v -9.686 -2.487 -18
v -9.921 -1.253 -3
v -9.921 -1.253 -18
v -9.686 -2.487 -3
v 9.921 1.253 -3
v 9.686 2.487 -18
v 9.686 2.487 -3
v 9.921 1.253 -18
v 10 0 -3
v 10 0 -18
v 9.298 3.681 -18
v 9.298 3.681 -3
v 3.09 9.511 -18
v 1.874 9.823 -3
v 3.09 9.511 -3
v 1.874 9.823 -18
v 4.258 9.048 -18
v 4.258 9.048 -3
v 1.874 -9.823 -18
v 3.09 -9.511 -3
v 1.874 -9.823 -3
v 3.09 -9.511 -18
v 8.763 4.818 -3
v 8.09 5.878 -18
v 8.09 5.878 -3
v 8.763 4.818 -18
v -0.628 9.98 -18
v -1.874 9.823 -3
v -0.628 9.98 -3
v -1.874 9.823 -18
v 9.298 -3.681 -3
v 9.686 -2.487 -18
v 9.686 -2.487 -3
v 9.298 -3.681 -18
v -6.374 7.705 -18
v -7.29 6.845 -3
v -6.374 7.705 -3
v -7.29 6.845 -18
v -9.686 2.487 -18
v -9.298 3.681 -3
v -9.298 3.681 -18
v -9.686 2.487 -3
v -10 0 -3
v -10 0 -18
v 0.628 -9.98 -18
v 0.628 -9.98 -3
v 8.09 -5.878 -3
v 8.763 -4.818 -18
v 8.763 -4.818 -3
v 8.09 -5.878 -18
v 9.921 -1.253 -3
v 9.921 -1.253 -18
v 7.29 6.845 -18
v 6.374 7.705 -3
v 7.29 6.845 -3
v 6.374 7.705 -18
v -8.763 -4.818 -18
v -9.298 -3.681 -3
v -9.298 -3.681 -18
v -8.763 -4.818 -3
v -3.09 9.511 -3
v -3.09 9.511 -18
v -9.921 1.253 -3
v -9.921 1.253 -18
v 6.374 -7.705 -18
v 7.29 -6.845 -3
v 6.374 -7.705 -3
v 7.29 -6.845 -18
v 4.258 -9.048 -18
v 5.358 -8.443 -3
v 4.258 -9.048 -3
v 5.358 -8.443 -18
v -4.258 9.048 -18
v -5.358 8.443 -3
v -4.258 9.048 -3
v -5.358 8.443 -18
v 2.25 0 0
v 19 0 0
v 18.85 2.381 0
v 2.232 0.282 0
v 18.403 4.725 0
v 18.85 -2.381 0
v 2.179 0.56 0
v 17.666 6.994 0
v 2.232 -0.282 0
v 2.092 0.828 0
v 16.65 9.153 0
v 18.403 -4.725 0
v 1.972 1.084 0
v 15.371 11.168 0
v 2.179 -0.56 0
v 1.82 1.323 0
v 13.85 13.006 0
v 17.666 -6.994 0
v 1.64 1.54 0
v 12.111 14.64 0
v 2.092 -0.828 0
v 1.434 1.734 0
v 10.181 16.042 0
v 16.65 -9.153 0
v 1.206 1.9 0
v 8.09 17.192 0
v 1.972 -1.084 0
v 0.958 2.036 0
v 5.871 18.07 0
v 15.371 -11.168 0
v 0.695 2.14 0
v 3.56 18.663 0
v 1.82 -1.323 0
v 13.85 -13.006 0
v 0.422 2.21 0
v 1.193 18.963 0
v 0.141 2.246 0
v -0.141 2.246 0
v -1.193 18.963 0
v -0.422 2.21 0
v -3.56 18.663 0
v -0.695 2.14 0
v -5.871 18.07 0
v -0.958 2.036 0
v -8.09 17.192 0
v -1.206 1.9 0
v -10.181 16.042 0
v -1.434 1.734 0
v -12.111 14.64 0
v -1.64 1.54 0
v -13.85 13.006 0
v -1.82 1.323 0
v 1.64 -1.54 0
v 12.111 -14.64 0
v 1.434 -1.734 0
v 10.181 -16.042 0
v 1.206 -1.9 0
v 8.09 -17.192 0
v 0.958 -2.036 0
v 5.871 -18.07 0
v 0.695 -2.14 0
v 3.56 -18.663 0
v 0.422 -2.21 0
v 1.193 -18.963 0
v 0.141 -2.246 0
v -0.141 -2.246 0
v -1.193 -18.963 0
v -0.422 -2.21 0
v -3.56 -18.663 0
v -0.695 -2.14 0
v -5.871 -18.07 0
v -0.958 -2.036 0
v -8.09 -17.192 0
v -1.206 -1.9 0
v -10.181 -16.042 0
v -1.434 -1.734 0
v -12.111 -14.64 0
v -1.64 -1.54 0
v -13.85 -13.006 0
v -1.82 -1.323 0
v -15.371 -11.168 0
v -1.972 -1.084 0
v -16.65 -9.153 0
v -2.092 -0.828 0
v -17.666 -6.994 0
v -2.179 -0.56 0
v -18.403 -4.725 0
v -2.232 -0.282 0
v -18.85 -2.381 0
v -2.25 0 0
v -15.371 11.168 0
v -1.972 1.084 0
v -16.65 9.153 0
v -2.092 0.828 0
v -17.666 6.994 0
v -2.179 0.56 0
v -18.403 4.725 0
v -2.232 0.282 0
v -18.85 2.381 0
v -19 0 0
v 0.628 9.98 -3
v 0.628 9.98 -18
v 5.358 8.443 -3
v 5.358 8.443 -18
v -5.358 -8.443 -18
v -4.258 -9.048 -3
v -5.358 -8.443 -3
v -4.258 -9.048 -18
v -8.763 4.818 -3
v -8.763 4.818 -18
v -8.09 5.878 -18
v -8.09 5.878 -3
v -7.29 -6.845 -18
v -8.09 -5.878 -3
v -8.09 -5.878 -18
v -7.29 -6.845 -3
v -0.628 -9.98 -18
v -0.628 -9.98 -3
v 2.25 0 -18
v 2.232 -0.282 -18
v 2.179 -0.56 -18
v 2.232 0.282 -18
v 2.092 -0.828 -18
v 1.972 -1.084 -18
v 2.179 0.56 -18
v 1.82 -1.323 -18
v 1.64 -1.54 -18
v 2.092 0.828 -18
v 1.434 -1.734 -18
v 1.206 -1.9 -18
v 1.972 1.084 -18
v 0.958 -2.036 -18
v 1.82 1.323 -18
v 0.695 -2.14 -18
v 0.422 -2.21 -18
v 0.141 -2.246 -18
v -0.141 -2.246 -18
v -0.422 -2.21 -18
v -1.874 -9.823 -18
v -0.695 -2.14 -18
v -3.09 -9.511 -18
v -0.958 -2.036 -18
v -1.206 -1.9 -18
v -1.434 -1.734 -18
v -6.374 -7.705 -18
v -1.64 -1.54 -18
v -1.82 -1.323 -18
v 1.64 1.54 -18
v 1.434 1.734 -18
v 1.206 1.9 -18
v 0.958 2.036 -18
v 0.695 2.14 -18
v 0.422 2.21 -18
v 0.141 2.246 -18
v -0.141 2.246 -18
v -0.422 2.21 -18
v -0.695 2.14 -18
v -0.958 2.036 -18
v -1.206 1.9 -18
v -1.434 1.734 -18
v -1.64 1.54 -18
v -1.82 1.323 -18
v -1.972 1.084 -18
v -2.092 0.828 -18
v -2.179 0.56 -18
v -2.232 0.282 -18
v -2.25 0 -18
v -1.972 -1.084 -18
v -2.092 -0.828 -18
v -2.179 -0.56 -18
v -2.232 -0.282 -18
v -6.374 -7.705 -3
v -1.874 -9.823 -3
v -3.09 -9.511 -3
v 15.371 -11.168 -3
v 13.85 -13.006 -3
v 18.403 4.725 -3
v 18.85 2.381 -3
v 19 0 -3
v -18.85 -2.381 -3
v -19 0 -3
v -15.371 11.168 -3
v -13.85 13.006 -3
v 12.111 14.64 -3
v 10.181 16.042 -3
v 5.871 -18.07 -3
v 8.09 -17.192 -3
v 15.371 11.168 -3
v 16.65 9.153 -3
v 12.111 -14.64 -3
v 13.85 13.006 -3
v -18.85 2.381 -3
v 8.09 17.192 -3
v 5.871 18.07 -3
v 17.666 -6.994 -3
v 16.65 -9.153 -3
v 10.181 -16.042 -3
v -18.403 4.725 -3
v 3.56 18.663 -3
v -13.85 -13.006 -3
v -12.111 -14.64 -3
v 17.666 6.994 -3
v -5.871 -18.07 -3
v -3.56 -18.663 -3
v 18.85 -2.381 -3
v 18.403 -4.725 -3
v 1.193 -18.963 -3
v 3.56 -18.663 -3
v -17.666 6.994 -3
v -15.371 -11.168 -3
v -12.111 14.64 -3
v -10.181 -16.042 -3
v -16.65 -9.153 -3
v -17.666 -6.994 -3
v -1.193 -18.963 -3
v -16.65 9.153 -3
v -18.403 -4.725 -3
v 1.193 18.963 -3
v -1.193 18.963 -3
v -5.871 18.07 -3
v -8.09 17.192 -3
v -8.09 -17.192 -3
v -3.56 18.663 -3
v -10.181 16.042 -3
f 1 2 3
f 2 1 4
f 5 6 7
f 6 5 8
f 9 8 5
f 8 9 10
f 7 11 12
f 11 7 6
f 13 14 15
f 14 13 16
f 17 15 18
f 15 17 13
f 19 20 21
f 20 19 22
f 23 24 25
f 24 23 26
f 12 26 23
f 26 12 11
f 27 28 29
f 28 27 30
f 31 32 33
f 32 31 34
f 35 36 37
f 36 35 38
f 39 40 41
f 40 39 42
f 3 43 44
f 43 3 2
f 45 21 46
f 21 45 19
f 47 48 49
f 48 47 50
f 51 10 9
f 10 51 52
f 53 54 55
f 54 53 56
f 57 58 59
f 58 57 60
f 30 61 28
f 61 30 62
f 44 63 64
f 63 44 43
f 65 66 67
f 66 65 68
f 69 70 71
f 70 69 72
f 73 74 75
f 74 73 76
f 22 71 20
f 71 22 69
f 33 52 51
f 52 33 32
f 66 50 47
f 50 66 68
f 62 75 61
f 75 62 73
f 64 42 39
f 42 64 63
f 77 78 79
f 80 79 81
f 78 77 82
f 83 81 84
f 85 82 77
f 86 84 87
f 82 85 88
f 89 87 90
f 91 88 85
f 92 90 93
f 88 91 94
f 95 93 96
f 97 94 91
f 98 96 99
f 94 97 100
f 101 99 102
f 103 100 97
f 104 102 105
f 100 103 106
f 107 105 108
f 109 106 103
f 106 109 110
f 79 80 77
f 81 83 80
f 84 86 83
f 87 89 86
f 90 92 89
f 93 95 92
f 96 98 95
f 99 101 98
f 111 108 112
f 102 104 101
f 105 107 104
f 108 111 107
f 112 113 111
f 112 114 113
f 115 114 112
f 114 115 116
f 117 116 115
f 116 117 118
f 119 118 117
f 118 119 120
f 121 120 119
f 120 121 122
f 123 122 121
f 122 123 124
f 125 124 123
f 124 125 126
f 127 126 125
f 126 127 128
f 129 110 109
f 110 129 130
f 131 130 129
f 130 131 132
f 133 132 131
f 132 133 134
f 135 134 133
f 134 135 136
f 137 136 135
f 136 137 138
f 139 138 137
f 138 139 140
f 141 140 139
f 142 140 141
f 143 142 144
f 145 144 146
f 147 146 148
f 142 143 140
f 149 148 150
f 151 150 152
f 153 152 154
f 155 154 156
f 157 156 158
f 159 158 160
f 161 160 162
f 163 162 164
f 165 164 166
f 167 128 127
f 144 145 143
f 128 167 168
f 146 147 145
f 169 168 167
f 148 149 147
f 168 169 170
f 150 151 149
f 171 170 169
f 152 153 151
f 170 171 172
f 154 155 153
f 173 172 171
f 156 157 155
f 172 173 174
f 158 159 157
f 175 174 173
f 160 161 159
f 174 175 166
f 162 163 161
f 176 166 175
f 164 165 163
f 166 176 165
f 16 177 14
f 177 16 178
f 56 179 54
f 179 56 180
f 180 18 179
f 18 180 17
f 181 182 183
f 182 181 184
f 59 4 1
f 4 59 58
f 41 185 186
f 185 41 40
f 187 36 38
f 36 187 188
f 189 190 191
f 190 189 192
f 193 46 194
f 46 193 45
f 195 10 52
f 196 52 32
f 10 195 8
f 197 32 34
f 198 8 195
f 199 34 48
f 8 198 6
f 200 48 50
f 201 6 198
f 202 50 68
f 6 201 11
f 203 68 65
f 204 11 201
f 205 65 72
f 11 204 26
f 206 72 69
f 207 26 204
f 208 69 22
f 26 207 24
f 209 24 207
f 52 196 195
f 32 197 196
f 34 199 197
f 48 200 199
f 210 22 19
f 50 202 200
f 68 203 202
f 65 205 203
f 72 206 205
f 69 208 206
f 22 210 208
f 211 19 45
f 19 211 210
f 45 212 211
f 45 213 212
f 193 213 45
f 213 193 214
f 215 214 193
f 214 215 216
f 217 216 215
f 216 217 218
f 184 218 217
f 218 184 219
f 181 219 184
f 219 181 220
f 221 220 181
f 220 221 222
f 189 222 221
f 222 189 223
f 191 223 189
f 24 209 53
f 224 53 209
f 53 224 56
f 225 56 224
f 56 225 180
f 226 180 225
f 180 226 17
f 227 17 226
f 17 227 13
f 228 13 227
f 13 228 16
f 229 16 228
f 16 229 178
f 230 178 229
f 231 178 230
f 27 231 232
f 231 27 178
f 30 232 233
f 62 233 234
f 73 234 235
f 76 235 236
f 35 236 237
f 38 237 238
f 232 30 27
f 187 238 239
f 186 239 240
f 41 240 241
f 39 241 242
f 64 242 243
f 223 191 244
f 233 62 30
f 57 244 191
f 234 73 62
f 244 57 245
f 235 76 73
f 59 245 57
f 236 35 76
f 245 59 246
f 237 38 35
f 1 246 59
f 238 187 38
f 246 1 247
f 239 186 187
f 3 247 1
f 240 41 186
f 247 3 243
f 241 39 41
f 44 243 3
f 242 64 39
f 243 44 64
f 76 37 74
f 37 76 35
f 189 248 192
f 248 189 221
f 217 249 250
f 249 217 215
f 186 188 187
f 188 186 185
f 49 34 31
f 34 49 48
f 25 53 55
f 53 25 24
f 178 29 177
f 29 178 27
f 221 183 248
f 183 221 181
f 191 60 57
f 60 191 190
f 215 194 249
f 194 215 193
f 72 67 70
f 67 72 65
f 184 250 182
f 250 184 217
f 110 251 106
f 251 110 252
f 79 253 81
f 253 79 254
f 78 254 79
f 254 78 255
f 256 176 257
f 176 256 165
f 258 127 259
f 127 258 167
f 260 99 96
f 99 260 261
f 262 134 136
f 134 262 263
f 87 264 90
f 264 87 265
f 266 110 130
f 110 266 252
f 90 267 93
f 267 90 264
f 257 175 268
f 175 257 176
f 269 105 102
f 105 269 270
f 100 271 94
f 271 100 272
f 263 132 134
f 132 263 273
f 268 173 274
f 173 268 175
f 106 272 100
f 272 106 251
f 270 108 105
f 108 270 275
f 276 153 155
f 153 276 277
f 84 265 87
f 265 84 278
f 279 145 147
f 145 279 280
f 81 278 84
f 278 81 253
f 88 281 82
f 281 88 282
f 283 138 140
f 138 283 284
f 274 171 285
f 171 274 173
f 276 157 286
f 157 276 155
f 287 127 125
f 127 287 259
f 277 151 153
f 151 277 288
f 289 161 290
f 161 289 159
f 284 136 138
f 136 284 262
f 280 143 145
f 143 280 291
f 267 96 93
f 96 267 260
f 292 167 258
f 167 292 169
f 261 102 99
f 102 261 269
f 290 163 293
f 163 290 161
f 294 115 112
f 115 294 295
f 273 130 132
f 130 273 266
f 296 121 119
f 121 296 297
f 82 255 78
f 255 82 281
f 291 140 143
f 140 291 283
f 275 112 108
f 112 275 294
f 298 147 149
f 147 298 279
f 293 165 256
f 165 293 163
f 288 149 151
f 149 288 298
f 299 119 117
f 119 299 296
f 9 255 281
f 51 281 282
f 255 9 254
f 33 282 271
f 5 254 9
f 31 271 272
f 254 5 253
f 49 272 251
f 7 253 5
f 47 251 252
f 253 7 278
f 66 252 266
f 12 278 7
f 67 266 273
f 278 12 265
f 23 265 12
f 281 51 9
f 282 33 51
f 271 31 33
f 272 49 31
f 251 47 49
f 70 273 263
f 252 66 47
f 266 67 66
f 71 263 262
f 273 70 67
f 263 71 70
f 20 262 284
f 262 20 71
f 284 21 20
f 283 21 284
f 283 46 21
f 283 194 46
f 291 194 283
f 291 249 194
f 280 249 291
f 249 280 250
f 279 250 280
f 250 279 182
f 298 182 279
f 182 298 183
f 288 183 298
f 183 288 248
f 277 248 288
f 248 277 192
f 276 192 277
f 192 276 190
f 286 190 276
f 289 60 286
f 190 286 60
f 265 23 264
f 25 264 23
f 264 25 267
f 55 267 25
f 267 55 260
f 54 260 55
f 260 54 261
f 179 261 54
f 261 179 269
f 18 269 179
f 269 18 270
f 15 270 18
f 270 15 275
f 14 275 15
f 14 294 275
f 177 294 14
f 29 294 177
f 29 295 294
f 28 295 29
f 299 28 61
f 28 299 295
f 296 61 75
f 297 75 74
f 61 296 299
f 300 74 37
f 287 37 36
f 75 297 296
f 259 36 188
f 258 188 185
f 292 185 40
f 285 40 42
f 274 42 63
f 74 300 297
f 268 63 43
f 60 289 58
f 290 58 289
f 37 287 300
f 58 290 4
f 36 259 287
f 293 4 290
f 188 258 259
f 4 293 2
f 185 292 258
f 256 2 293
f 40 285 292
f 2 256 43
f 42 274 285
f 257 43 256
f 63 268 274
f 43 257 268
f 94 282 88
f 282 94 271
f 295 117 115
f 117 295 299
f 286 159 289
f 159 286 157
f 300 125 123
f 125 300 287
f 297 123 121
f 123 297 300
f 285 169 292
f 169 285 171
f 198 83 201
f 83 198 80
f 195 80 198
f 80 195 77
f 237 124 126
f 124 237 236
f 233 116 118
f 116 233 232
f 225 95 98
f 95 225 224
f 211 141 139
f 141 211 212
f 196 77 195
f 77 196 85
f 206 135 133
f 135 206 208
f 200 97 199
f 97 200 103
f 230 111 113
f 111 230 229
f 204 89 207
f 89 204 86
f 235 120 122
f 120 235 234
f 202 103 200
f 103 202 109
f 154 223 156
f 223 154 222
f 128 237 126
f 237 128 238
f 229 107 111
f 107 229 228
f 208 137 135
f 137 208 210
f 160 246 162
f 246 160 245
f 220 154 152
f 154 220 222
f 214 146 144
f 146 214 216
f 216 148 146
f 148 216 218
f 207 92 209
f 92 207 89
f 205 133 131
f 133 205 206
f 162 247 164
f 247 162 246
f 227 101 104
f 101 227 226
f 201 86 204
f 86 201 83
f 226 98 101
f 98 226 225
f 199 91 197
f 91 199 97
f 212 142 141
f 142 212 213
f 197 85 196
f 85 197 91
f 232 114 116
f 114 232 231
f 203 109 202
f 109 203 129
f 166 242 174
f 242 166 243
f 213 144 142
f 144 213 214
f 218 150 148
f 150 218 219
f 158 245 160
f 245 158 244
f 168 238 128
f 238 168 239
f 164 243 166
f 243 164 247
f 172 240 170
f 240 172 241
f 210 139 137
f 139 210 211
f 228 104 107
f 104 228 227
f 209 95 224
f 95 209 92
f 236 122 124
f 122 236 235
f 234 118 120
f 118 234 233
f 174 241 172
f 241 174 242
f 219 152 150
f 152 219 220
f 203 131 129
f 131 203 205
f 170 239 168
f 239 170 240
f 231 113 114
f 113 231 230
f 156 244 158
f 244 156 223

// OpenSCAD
$fn = 50;


difference() {
	union() {
		translate(v = [0, 0, -18.0000000000]) {
			cylinder(h = 18, r = 10.0000000000);
		}
		translate(v = [0, 0, -3.0000000000]) {
			cylinder(h = 3, r = 19.0000000000);
		}
	}
	union() {
		#translate(v = [0, 0, -18]) {
			cylinder(h = 18, r = 2.2500000000);
		}
	}
}
